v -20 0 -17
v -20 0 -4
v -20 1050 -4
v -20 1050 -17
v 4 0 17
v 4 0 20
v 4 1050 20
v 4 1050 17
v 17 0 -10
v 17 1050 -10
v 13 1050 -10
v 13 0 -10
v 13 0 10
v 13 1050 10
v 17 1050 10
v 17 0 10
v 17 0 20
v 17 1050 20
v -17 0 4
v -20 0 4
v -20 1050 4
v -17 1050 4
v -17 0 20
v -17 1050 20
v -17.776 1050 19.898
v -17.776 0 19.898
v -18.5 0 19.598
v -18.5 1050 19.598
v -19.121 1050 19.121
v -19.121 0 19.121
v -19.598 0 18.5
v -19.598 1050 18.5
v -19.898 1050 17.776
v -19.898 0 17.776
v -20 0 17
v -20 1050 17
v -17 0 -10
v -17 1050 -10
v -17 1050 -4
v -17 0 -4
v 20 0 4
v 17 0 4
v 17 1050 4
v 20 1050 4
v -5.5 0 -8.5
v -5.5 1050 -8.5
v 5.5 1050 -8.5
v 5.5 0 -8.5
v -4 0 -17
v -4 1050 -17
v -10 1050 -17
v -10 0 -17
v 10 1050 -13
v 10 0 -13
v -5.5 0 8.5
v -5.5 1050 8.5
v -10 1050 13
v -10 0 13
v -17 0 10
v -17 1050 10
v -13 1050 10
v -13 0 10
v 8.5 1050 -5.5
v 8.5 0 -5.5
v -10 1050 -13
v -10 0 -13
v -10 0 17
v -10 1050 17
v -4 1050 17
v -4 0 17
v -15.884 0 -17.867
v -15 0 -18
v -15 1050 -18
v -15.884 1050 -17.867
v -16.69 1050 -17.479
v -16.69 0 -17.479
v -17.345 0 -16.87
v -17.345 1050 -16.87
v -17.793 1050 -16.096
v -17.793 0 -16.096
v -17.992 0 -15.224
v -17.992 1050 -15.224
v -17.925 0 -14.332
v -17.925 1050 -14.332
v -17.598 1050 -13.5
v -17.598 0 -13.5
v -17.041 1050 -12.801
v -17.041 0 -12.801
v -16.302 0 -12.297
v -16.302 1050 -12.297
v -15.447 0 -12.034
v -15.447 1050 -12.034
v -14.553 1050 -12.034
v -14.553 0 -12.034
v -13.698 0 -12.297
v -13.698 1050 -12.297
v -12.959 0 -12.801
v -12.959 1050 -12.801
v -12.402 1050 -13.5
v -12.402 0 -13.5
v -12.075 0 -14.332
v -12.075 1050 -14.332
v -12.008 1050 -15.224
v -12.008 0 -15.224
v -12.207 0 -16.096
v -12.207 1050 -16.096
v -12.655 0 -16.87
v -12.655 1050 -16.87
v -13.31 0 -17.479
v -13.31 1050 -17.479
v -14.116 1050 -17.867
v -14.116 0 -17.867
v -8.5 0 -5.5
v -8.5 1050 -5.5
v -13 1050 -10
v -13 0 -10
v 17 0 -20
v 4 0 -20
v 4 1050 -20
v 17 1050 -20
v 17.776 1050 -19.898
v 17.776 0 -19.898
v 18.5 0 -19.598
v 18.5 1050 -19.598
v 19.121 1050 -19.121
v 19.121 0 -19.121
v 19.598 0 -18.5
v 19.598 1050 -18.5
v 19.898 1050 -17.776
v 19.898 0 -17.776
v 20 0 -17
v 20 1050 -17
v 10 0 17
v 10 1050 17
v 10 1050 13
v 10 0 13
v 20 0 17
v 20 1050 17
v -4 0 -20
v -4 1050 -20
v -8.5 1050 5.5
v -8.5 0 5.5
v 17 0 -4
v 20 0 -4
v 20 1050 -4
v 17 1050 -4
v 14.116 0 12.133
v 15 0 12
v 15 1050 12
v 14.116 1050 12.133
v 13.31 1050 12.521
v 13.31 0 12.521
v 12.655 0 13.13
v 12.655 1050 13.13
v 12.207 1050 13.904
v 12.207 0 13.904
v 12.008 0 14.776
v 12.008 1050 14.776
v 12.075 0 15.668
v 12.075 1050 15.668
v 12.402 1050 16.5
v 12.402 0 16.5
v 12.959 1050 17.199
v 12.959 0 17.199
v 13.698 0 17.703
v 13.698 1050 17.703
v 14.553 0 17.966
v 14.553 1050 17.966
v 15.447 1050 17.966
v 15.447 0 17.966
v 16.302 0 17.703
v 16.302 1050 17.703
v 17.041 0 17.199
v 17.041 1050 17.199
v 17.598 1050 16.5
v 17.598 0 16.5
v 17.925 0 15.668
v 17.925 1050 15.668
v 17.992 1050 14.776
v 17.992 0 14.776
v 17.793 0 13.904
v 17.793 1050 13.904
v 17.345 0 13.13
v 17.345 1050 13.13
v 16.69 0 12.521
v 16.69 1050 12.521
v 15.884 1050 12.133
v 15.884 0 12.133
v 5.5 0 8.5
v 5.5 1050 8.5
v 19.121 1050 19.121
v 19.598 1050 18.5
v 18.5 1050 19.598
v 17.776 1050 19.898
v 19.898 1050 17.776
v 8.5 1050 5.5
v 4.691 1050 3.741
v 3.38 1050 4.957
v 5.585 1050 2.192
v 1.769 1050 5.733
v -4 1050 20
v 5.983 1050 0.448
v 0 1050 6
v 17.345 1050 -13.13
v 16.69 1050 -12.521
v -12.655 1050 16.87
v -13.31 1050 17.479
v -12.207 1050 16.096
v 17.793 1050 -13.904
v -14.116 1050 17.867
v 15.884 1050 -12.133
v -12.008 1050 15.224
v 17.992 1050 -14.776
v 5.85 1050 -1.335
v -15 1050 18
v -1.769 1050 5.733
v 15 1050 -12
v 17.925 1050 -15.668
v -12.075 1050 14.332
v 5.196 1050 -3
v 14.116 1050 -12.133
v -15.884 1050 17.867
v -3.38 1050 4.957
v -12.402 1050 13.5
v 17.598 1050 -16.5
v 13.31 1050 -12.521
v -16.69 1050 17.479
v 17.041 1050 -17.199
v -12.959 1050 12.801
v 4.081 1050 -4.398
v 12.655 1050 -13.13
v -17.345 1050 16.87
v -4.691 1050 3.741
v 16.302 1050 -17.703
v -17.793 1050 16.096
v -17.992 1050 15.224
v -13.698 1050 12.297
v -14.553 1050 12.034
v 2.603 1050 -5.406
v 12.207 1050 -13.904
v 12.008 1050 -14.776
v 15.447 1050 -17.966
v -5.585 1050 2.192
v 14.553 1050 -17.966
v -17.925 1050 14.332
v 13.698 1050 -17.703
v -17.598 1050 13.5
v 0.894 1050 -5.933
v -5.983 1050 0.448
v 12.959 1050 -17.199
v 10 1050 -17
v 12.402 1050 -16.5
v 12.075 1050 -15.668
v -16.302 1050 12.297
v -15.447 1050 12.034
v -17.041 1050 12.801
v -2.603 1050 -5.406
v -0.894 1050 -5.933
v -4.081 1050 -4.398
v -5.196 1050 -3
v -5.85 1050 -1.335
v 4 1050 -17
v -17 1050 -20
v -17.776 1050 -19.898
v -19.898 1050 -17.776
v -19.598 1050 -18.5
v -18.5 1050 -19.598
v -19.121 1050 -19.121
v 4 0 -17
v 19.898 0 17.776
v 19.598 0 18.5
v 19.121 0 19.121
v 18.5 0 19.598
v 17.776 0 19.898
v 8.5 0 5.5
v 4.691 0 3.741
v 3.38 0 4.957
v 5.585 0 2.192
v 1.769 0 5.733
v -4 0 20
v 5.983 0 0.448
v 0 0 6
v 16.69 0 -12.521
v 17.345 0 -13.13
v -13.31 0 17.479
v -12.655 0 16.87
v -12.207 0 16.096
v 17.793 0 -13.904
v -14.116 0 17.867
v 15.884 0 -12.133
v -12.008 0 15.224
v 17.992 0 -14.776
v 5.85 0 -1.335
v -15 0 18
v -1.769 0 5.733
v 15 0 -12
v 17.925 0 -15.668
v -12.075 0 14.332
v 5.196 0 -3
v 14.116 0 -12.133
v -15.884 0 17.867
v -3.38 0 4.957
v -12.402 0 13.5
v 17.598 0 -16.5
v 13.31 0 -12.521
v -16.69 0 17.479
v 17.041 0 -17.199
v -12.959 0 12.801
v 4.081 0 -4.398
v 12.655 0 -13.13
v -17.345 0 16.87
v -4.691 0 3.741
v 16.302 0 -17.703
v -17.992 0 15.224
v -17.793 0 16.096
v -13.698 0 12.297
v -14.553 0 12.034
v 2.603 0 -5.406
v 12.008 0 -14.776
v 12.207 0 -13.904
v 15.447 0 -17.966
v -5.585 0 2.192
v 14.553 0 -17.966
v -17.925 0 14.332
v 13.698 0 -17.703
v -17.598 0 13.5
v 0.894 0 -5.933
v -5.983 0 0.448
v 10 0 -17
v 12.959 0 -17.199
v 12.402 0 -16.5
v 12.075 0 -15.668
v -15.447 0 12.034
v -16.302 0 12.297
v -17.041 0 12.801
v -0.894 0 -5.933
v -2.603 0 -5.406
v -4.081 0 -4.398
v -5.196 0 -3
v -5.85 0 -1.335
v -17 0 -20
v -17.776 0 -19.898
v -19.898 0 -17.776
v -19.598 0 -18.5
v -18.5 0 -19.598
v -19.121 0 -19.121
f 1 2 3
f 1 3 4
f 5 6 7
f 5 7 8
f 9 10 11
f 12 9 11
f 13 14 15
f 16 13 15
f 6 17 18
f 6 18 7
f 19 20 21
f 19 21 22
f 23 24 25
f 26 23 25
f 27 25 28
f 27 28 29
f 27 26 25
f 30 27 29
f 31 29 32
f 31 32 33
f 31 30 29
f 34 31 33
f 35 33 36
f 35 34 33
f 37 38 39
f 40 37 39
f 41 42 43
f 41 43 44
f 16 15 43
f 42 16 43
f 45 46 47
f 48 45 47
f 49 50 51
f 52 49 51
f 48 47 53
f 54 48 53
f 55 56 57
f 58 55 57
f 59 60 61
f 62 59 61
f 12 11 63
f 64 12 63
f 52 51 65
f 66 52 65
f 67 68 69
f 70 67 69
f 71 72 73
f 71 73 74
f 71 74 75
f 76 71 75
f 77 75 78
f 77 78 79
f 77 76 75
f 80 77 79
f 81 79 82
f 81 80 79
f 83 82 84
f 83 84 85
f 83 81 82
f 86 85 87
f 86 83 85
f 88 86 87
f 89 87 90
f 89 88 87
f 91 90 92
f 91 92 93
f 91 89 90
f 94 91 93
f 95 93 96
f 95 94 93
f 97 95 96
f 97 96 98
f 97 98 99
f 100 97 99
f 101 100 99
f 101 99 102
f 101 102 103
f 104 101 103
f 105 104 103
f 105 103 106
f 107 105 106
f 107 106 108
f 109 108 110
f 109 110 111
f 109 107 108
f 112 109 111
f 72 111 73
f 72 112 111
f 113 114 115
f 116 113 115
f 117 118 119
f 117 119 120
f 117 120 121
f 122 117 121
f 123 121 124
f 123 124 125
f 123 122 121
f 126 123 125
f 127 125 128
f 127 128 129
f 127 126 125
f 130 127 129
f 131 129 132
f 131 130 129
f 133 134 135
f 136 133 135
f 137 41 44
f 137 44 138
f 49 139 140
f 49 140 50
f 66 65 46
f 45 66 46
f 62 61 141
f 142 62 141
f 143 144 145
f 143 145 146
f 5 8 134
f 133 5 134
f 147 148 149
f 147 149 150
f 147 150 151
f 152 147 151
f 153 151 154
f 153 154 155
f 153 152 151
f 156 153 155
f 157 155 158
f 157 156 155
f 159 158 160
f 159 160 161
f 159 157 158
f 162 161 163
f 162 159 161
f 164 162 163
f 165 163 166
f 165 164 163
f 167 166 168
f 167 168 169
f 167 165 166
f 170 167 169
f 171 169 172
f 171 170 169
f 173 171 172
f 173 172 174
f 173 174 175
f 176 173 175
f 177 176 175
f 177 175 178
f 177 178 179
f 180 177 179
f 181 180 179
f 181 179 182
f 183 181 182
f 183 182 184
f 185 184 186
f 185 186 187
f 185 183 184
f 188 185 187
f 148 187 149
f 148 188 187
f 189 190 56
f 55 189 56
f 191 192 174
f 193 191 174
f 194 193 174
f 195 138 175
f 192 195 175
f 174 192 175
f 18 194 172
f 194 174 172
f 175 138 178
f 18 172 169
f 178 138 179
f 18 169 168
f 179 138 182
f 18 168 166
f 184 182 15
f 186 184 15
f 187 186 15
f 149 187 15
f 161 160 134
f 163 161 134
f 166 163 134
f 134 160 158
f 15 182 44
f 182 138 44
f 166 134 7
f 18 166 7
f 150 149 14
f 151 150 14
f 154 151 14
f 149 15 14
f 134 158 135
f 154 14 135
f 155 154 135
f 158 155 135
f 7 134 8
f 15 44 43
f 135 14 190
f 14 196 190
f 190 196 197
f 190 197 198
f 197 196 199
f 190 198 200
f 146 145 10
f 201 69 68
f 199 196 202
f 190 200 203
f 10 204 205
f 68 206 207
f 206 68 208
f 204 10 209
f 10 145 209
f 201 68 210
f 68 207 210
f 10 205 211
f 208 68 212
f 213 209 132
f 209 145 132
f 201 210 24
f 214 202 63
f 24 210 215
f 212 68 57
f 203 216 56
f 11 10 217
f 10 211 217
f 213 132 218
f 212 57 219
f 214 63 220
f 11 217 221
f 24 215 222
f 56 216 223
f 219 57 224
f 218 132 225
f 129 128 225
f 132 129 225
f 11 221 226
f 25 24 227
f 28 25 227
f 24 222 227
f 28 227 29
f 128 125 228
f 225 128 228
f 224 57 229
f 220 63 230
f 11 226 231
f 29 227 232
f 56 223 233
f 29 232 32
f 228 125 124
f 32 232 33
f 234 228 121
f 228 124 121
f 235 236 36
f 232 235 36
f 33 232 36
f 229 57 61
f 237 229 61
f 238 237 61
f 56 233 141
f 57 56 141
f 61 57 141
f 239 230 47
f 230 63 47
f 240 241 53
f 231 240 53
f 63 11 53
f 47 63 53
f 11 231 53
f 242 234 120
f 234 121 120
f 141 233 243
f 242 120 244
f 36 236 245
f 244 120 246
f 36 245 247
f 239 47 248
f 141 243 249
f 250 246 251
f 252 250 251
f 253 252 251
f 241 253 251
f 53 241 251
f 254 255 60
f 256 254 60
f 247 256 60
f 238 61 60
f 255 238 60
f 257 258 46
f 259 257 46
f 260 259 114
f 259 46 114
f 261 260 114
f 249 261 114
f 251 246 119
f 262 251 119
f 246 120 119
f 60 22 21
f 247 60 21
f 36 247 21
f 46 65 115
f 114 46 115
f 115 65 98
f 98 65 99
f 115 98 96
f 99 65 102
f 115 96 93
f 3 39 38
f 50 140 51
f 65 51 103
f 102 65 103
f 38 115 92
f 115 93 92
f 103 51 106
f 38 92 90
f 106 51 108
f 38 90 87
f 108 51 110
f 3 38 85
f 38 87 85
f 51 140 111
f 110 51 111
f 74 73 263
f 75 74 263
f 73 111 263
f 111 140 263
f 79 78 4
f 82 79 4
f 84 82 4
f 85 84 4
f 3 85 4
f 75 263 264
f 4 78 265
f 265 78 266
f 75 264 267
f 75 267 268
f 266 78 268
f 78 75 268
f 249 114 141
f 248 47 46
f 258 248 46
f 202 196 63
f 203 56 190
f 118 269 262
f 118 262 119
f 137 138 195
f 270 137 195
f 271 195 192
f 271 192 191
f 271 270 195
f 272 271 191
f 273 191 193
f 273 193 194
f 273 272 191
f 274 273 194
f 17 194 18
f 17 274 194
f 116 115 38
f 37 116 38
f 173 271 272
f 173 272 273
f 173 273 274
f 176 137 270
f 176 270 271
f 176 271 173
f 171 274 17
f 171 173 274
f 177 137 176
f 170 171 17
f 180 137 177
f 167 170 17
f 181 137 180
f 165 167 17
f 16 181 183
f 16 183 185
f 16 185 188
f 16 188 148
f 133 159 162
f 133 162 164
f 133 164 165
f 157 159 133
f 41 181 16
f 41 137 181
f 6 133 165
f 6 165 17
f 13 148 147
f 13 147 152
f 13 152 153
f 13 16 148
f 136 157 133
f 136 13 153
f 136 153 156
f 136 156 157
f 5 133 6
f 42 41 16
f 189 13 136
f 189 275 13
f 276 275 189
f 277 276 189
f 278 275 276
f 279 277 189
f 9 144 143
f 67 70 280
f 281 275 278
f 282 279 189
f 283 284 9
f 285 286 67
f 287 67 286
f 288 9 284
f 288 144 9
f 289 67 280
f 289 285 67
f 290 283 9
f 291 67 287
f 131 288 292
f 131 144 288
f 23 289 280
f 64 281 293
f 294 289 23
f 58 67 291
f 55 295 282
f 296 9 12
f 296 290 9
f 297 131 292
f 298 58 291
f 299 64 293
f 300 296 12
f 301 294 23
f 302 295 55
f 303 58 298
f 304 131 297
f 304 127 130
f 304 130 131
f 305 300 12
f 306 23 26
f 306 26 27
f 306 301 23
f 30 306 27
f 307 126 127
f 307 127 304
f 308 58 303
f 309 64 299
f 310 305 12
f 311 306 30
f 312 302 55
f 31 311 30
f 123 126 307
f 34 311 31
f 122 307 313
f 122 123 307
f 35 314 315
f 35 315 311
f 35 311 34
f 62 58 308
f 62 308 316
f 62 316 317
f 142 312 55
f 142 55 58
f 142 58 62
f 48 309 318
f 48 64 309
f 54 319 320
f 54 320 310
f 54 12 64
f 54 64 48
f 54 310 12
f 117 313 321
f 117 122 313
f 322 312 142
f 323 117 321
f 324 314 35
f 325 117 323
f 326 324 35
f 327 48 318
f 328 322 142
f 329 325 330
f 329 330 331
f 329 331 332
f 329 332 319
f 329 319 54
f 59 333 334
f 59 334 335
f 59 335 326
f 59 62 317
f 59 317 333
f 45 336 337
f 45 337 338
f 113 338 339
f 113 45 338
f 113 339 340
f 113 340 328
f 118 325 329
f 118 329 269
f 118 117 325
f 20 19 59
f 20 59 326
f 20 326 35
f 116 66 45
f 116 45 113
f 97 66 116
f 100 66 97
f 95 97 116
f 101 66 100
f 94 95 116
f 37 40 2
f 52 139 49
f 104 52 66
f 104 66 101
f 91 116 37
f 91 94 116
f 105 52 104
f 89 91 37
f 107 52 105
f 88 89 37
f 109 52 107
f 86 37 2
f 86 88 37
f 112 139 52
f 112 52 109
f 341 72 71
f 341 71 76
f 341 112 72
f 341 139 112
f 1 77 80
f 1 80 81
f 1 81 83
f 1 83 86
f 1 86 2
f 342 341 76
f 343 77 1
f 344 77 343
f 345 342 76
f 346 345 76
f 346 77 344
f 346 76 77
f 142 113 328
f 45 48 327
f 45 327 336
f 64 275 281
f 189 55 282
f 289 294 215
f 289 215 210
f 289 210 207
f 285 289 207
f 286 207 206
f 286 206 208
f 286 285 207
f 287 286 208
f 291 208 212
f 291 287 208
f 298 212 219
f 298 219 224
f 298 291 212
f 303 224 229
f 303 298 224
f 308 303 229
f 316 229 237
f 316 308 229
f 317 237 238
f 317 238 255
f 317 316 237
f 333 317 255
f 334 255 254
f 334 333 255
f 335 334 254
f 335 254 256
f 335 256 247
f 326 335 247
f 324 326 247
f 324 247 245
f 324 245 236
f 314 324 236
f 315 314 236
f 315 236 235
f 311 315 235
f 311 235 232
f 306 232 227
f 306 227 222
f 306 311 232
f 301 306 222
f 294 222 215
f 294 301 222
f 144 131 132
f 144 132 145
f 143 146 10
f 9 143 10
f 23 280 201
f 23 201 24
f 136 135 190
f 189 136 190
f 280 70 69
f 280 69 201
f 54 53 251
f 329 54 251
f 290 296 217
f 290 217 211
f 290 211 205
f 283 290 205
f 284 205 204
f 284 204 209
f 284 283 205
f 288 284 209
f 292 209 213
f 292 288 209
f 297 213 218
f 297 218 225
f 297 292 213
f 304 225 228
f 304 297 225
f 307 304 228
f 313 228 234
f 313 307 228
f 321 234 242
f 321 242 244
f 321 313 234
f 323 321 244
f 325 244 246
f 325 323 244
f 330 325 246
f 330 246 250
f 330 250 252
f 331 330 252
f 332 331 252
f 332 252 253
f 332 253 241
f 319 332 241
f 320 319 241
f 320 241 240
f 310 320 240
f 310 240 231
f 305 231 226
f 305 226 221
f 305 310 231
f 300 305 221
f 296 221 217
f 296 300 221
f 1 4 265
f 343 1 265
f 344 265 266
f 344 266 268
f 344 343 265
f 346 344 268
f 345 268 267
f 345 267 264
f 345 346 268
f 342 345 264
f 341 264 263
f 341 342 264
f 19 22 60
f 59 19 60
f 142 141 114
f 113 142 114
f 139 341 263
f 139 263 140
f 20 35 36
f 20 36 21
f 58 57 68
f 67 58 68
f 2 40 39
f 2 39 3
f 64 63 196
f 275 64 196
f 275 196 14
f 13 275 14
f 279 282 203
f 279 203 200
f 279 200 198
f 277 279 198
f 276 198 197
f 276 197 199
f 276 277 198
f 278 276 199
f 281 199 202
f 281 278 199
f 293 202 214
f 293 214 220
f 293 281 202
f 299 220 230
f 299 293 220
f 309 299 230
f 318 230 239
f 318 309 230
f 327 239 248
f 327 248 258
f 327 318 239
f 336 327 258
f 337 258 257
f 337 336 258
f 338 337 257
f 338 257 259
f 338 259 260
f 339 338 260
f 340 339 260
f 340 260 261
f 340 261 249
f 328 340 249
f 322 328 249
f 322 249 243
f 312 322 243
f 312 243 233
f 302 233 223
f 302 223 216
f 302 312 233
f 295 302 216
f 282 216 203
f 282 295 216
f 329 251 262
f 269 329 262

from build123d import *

# Parameters (mm, degrees)
SKETCH1_R           = 6
SKETCH1_R_2         = 3
BOSS_EXTRUDE1_DEPTH = 1050


with BuildPart() as part:
    # Sketch1 → Boss-Extrude1 (new body)
    with BuildSketch(Plane(origin=(0, 0, 0), x_dir=(1, 0, 0), z_dir=(0, 1, 0))):
        with BuildLine():
            Line((-20, -4), (-17, -4))
            Line((-17, -4), (-17, -10))
            Line((-17, -10), (-13, -10))
            Line((-13, -10), (-8.5, -5.5))
            Line((-8.5, -5.5), (-8.5, 5.5))
            Line((-8.5, 5.5), (-13, 10))
            Line((-13, 10), (-17, 10))
            Line((-17, 10), (-17, 4))
            Line((-17, 4), (-20, 4))
            Line((-20, 4), (-20, 17))
            ThreePointArc((-20, 17), (-19.121320344, 19.121320344), (-17, 20))
            Line((-17, 20), (-4, 20))
            Line((-4, 20), (-4, 17))
            Line((-4, 17), (-10, 17))
            Line((-10, 17), (-10, 13))
            Line((-10, 13), (-5.5, 8.5))
            Line((-5.5, 8.5), (5.5, 8.5))
            Line((5.5, 8.5), (10, 13))
            Line((10, 13), (10, 17))
            Line((10, 17), (4, 17))
            Line((4, 17), (4, 20))
            Line((4, 20), (17, 20))
            ThreePointArc((17, 20), (19.121320344, 19.121320344), (20, 17))
            Line((20, 17), (20, 4))
            Line((20, 4), (17, 4))
            Line((17, 4), (17, 10))
            Line((17, 10), (13, 10))
            Line((13, 10), (8.5, 5.5))
            Line((8.5, 5.5), (8.5, -5.5))
            Line((8.5, -5.5), (13, -10))
            Line((13, -10), (17, -10))
            Line((17, -10), (17, -4))
            Line((17, -4), (20, -4))
            Line((20, -4), (20, -17))
            ThreePointArc((20, -17), (19.121320344, -19.121320344), (17, -20))
            Line((17, -20), (4, -20))
            Line((4, -20), (4, -17))
            Line((4, -17), (10, -17))
            Line((10, -17), (10, -13))
            Line((10, -13), (5.5, -8.5))
            Line((5.5, -8.5), (-5.5, -8.5))
            Line((-5.5, -8.5), (-10, -13))
            Line((-10, -13), (-10, -17))
            Line((-10, -17), (-4, -17))
            Line((-4, -17), (-4, -20))
            Line((-4, -20), (-17, -20))
            ThreePointArc((-17, -20), (-19.121320344, -19.121320344), (-20, -17))
            Line((-20, -17), (-20, -4))
        make_face()
        with Locations(Location((0, 0, 0), (0, 0, 270))):
            Circle(SKETCH1_R, mode=Mode.SUBTRACT)
        with Locations(Location((-15, -15, 0), (0, 0, 270))):
            Circle(SKETCH1_R_2, mode=Mode.SUBTRACT)
        with Locations(Location((-15, 15, 0), (0, 0, 90))):
            Circle(SKETCH1_R_2, mode=Mode.SUBTRACT)
        with Locations(Location((15, 15, 0), (0, 0, 270))):
            Circle(SKETCH1_R_2, mode=Mode.SUBTRACT)
        with Locations(Location((15, -15, 0), (0, 0, 90))):
            Circle(SKETCH1_R_2, mode=Mode.SUBTRACT)
    extrude(amount=BOSS_EXTRUDE1_DEPTH)


solid = part.part
